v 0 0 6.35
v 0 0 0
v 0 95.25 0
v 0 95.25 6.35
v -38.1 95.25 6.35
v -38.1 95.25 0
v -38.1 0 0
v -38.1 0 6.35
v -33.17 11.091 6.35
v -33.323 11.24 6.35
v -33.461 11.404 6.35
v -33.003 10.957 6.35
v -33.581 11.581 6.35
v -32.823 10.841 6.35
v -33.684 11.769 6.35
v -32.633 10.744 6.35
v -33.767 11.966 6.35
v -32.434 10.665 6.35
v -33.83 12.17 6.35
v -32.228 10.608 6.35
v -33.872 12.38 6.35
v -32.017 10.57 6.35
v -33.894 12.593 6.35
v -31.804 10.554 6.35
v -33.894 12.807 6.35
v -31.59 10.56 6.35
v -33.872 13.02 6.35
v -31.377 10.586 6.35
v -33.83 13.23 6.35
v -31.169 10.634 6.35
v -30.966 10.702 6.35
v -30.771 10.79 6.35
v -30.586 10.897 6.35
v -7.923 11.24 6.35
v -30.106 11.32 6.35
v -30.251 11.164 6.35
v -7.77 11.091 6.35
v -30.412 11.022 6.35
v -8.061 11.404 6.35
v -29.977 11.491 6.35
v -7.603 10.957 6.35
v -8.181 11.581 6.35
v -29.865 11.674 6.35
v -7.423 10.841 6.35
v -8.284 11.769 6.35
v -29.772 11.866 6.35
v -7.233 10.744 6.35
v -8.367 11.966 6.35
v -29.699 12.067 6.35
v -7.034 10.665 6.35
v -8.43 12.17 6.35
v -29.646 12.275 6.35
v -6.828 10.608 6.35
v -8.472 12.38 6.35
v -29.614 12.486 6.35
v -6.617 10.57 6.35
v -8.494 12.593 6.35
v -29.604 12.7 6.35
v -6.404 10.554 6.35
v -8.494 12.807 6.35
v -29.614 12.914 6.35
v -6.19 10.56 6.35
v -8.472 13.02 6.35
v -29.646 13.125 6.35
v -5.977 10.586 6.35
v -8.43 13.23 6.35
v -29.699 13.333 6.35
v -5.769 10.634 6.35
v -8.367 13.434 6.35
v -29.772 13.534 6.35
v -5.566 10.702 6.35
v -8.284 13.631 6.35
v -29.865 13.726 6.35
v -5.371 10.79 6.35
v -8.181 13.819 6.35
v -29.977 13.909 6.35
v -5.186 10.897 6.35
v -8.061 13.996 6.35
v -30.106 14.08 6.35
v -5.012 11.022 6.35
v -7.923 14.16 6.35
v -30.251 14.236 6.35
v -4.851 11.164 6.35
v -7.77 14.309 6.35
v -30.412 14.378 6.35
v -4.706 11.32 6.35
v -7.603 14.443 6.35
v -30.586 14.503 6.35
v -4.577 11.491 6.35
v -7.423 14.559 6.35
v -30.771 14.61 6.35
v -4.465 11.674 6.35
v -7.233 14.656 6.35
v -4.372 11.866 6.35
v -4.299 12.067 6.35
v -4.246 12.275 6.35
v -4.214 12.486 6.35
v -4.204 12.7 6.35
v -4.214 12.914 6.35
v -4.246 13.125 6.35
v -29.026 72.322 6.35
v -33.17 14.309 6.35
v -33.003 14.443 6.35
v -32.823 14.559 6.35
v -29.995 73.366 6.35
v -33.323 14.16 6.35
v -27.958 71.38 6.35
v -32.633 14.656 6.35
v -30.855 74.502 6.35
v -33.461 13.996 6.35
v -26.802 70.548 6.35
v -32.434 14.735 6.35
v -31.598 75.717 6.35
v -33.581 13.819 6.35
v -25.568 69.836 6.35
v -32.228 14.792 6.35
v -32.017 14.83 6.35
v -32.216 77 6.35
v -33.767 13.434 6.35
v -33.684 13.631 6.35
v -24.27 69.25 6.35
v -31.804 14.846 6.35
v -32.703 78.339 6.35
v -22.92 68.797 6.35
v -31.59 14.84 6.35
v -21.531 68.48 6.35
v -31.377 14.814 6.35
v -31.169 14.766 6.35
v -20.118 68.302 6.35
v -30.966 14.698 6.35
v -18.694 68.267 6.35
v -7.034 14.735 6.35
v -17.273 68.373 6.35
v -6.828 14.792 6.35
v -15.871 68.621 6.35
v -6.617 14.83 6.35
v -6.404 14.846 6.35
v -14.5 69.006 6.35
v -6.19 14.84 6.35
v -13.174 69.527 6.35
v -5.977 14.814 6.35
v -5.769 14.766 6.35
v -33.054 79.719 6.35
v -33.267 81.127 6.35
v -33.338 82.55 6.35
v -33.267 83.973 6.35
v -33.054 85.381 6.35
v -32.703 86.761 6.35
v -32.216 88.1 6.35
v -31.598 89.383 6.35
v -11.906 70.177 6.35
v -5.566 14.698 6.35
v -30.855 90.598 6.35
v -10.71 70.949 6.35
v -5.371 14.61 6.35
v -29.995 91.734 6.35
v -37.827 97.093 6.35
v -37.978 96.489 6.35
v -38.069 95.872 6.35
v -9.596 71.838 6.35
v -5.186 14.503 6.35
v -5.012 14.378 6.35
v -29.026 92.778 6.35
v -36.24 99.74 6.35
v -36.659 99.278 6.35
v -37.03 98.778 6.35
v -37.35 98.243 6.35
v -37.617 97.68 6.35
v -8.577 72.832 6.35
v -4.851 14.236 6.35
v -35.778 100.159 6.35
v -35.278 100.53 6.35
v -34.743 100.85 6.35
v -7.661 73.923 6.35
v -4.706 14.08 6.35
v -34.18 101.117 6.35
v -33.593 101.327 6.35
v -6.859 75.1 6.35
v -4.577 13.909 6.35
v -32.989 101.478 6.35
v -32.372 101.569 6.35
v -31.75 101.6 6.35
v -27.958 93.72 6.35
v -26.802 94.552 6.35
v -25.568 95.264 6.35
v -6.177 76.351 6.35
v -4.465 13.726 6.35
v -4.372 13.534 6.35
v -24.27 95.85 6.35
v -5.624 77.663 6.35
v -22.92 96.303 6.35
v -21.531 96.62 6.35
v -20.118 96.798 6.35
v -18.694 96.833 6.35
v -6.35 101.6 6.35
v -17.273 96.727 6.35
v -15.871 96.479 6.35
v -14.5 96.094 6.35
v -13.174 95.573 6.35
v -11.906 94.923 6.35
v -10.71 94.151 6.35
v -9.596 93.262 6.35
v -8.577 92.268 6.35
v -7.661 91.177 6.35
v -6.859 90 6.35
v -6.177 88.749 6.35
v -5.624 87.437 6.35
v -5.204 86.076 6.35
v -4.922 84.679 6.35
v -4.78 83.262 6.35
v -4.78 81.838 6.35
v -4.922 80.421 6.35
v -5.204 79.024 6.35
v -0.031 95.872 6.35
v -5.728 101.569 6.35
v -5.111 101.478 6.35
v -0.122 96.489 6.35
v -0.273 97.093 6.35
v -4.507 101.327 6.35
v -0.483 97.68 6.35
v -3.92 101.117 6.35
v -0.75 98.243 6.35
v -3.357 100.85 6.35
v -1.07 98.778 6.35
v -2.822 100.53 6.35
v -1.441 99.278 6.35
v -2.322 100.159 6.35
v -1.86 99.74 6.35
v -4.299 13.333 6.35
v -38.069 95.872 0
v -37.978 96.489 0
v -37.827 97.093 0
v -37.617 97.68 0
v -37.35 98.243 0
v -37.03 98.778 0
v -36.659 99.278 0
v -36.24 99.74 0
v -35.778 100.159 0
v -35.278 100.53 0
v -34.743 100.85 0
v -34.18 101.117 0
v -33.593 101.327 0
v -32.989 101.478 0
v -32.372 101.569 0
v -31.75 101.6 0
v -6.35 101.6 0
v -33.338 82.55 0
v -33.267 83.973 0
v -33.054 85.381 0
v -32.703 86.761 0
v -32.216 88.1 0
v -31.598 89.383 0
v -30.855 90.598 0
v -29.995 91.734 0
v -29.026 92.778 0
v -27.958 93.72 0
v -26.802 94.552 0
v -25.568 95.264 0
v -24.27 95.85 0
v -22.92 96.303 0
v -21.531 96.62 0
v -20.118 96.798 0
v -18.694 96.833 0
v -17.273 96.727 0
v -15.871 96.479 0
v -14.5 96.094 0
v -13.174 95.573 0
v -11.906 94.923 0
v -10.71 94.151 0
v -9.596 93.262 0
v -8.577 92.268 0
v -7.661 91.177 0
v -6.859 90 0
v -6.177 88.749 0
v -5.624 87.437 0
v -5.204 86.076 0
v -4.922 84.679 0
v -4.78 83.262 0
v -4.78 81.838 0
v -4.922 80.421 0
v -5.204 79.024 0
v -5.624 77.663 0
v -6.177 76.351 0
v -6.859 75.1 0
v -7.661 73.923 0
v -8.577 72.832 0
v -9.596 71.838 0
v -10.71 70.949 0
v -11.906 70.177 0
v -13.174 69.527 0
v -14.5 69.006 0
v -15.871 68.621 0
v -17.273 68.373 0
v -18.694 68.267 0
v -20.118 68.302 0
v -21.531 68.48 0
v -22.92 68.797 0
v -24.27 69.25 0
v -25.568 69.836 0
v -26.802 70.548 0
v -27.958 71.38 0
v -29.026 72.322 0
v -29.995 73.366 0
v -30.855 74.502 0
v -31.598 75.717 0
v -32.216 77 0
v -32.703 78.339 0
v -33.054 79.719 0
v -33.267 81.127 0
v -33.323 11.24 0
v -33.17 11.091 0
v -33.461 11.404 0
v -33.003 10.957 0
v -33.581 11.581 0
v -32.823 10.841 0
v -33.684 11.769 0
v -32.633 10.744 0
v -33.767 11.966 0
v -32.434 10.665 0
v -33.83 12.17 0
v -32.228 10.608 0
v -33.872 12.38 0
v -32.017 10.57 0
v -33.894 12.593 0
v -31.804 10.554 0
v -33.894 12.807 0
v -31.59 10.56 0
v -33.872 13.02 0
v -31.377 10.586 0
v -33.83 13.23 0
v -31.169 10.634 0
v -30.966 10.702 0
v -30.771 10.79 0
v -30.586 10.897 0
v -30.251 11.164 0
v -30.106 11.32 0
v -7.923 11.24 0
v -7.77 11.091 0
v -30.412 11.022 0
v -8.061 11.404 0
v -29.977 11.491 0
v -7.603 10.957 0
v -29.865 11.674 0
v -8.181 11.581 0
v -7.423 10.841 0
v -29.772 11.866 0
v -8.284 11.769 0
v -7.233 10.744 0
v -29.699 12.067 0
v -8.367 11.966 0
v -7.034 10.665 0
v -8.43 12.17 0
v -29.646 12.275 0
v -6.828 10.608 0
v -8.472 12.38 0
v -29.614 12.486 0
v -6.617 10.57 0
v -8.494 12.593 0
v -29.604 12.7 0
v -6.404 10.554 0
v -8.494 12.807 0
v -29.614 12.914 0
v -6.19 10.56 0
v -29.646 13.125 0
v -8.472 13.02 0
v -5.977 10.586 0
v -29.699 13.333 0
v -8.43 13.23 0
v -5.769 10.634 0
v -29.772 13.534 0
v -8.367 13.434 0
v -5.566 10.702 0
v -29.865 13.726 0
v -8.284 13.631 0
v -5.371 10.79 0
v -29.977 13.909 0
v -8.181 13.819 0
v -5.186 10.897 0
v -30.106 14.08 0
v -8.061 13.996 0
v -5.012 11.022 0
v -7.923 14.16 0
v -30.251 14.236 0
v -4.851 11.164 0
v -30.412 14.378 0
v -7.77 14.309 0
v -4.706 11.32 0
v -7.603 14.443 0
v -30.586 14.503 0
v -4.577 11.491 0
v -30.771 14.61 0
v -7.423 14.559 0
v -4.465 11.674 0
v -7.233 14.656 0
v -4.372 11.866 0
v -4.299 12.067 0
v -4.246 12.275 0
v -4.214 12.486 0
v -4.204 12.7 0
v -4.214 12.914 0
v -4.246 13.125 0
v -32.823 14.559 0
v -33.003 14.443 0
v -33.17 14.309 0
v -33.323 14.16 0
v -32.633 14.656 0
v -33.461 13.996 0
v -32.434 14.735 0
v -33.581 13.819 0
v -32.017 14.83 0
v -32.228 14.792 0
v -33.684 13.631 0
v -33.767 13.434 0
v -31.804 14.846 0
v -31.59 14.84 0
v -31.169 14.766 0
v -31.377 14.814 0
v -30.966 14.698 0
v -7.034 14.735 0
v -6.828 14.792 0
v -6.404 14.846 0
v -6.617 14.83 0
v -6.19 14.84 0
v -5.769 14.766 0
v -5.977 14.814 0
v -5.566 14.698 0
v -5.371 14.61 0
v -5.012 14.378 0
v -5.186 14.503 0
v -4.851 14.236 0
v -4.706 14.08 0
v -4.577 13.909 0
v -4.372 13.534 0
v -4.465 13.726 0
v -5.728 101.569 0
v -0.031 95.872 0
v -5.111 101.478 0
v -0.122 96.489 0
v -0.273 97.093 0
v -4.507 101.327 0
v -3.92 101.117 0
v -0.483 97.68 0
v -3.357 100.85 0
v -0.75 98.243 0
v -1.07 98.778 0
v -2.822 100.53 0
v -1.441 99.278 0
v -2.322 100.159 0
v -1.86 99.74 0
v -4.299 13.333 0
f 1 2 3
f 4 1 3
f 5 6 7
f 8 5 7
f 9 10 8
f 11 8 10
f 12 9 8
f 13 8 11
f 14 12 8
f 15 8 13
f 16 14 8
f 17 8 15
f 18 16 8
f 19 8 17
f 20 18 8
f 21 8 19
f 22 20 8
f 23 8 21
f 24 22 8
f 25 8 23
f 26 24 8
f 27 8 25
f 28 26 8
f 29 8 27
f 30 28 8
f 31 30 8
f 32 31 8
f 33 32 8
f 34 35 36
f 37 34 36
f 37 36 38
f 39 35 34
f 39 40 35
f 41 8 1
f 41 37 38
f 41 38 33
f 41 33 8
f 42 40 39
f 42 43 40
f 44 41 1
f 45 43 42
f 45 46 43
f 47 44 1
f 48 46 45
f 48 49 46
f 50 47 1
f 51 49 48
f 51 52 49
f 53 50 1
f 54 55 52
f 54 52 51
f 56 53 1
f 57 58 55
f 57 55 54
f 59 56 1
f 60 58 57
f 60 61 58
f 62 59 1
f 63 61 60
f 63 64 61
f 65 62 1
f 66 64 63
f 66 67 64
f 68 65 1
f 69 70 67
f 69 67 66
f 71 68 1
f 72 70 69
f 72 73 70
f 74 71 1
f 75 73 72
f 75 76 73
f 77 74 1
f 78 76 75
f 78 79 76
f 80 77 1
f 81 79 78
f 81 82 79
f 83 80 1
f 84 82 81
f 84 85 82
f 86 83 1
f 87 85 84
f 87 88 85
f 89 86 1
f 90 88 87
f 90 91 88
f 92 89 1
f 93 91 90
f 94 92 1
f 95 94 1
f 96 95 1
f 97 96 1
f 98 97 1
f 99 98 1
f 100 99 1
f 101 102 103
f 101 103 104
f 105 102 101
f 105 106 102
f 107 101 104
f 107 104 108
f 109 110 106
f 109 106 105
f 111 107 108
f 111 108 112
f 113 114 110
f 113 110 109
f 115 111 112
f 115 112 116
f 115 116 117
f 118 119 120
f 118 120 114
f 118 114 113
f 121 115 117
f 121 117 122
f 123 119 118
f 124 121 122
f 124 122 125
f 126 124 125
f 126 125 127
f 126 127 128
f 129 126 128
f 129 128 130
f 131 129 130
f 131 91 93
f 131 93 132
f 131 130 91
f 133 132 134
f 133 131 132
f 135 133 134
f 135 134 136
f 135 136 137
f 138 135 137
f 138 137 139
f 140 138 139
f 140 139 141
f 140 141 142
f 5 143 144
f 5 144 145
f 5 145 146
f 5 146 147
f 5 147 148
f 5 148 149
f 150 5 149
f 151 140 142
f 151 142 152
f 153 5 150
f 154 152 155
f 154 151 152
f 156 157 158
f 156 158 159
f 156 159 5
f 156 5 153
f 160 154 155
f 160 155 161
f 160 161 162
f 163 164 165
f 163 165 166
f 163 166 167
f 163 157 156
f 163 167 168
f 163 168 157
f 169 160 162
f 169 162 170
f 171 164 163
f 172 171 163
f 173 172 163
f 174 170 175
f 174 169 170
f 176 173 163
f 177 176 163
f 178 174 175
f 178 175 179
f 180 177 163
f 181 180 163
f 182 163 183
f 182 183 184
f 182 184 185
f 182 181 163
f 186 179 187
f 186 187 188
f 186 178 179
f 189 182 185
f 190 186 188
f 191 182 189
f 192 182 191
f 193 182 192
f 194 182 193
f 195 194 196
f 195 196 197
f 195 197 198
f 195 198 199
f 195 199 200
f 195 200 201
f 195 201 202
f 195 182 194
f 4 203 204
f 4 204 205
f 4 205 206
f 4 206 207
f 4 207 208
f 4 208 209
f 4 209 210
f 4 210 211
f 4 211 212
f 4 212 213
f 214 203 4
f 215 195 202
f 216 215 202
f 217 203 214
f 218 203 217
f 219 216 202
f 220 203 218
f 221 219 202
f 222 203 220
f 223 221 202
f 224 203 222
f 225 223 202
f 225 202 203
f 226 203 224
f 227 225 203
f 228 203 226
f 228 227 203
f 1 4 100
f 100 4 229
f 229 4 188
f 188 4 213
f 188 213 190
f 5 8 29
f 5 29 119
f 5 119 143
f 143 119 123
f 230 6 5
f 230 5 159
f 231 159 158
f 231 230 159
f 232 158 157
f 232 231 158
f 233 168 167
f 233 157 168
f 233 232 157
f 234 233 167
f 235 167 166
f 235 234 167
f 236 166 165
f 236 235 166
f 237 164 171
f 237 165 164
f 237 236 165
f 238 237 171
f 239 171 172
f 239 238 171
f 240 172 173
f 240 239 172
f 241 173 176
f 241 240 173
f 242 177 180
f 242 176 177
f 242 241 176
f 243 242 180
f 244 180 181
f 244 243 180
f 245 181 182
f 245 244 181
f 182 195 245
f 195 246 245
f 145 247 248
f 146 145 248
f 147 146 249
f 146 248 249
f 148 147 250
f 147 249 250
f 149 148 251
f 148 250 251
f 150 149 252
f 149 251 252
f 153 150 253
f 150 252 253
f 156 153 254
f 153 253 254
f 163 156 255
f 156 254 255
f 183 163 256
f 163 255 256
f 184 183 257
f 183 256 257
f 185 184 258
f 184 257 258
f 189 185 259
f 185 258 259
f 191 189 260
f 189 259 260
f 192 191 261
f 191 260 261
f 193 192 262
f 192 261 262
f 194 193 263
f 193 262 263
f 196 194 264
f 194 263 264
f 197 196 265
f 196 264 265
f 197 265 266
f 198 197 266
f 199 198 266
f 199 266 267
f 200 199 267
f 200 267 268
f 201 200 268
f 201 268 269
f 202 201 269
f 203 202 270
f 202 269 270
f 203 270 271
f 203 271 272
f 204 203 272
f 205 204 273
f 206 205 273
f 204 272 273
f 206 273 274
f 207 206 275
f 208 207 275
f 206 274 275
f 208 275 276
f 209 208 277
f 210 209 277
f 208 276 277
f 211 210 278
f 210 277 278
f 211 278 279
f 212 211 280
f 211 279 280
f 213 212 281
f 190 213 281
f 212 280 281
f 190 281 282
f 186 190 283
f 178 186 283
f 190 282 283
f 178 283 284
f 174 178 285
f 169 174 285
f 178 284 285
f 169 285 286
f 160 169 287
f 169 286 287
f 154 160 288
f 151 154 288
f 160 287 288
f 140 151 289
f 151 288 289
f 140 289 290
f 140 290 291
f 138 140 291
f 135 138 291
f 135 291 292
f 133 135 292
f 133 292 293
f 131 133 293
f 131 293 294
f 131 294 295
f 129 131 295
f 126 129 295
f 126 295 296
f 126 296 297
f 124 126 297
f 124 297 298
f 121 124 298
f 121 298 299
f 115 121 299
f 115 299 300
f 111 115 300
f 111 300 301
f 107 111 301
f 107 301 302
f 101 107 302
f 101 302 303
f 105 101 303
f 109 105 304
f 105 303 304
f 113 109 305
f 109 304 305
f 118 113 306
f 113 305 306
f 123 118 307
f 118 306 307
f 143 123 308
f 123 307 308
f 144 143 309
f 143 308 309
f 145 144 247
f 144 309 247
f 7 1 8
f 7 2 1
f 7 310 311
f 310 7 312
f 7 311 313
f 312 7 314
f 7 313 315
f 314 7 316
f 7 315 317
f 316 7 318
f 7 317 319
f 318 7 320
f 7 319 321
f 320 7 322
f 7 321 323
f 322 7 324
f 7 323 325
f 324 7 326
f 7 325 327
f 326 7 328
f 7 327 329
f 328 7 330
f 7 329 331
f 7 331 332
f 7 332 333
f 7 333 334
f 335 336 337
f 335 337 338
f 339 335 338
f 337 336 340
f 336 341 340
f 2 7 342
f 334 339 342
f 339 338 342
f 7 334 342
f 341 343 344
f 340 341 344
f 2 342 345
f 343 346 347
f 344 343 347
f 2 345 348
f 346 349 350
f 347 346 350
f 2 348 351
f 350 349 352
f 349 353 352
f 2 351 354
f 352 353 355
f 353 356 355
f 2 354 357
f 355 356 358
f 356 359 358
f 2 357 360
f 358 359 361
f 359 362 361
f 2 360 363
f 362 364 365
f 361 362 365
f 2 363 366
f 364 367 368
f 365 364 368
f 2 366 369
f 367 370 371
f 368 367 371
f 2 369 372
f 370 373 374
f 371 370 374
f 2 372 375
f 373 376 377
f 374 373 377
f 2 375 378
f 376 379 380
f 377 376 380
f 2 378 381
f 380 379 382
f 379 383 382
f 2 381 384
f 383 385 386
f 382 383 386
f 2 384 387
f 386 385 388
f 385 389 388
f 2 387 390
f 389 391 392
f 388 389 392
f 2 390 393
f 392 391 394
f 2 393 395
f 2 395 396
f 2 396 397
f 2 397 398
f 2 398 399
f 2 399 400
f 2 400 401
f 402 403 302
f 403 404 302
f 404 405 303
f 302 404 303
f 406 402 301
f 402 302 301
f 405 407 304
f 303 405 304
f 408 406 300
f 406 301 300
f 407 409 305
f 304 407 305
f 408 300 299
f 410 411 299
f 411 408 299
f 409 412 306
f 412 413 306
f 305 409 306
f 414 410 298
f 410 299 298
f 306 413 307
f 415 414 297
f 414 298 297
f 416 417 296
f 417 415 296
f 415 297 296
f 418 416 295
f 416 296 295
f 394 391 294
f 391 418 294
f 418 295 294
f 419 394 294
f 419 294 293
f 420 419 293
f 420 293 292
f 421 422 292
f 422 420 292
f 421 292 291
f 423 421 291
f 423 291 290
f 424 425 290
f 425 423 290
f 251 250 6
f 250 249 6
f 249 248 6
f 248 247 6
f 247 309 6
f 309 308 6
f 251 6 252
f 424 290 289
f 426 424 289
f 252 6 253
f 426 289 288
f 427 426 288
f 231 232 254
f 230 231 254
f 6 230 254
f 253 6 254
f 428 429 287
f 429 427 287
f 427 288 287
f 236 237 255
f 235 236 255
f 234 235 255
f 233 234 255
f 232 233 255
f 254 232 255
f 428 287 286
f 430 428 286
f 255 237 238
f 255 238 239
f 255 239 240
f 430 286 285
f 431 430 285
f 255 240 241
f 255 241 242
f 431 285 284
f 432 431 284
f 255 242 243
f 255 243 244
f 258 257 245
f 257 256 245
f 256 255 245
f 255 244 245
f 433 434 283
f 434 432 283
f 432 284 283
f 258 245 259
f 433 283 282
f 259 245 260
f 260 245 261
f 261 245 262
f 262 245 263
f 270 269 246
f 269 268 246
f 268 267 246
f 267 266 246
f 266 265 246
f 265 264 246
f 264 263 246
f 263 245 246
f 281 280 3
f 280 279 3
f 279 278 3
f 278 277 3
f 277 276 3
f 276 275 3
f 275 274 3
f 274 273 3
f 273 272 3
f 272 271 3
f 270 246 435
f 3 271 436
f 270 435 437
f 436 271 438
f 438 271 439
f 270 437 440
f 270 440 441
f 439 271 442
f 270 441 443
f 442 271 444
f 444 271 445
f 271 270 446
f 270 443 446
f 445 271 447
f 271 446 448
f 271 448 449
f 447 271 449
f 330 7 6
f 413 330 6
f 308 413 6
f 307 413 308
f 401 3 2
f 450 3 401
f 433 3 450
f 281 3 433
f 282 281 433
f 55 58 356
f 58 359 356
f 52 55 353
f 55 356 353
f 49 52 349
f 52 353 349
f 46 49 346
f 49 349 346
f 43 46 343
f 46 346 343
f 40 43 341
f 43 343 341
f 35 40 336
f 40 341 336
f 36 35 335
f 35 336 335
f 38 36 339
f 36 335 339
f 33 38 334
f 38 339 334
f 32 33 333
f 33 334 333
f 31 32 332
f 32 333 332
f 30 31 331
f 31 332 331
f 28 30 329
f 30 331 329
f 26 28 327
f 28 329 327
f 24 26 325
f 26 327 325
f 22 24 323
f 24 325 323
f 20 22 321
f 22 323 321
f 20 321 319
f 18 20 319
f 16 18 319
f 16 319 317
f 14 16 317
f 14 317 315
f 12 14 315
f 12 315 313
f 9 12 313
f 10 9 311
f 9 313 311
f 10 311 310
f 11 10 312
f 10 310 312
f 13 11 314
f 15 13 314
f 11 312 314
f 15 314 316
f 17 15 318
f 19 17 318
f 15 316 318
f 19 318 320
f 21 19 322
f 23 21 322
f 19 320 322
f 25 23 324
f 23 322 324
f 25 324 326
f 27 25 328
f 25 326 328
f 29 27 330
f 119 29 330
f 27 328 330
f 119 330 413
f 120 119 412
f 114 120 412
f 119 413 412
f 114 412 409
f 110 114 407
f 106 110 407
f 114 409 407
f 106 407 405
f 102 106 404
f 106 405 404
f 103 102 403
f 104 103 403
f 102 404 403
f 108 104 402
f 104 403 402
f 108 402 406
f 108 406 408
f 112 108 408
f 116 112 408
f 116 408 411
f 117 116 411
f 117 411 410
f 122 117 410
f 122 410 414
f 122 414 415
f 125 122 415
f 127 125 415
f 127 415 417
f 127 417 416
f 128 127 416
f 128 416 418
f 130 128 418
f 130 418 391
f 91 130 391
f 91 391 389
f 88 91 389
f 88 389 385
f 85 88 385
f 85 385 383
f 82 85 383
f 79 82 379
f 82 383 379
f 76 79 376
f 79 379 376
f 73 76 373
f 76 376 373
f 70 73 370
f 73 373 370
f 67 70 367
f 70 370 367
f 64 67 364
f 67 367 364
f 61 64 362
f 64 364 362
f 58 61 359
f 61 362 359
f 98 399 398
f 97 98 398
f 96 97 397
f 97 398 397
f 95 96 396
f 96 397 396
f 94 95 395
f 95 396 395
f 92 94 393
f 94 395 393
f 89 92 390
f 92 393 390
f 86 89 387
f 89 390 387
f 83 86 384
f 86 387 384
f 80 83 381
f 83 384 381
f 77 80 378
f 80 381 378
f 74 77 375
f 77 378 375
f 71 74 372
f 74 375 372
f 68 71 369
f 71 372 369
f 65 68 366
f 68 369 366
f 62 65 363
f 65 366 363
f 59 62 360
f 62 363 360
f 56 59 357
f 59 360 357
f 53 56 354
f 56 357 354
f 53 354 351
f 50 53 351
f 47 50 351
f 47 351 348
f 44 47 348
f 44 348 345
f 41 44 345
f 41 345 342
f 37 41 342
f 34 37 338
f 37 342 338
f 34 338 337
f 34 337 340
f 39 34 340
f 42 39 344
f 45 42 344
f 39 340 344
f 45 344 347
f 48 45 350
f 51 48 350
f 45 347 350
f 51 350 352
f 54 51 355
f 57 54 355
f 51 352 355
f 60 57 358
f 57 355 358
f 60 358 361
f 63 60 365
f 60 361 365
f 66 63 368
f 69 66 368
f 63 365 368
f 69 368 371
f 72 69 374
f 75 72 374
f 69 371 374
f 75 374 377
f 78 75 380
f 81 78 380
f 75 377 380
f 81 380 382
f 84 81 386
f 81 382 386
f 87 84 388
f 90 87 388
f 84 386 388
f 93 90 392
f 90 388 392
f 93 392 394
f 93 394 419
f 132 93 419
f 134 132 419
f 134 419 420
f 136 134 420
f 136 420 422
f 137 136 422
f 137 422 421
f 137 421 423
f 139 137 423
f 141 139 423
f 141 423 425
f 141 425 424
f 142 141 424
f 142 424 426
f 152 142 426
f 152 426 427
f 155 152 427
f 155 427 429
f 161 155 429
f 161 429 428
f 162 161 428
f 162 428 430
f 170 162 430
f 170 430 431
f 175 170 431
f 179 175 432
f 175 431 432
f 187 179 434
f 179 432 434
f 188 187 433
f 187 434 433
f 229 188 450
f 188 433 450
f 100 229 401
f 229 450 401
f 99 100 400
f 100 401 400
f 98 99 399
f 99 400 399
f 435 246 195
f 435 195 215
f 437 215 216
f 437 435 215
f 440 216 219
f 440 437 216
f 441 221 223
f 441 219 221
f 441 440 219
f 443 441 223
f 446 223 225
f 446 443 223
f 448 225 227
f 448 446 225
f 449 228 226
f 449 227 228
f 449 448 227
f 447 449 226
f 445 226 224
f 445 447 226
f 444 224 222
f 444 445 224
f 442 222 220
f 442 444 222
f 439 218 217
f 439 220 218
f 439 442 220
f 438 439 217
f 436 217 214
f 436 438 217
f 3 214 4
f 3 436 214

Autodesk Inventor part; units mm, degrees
ref_plane "YZ Plane" through (0, 0, 0) normal (1, 0, 0) x (0, 1, 0)
ref_plane "XZ Plane" through (0, 0, 0) normal (0, 1, 0) x (-1, 0, 0)
ref_plane "XY Plane" through (0, 0, 0) normal (0, 0, 1) x (1, 0, 0)
sketch "Sketch1" plane through (0, 0, 0) normal (0, 0, 1) x (1, 0, 0)
  line L0 (0, 0) -> (-38.1, 0)
  line L1 (0, 0) -> (0, 95.25)
  line L2 (-6.35, 101.6) -> (-38.1, 101.6)
  line L3 (-38.1, 95.25) -> (-38.1, 0)
  line L4 (-31.75, 101.6) -> (-31.75, 101.6)
  line L5 (-31.75, 101.6) -> (-31.75, 12.7)
  line L6 (0, 101.6) -> (-6.35, 101.6)
  line L7 (-6.35, 101.6) -> (-6.35, 12.7)
  circle A0 centre (-31.75, 12.7) radius 2.1463
  circle A1 centre (-6.35, 12.7) radius 2.1463
  arc A2 (-31.75, 101.6) -> (-38.1, 95.25) centre (-31.75, 95.25) ccw
  arc A3 (0, 95.25) -> (-6.35, 101.6) centre (-6.35, 95.25) ccw
  line L8 (-22.225, 101.6) -> (-22.225, 76.2)
  dimension "d0" = 38.1
  dimension "d1" = 101.6
  dimension "d2" = 6.35
  dimension "d3" = 88.9
  dimension "d4" = 6.35
  dimension "d5" = 4.2926
  dimension "d6" = 4.2926
  dimension "d7" = 88.9
  dimension "d19" = 6.35
  dimension "d20" = 6.35
  dimension "d23" = 25.4
extrude "Plate1" add sketch "Sketch1" along normal blind 6.35
sketch "Sketch4" plane through (0, 0, 0) normal (0, 0, -1) x (-1, 0, 0)
  line L0 (6.35, 101.6) -> (31.75, 101.6) projected
  line L1 (19.05, 101.6) -> (19.05, 82.55)
  circle A0 centre (19.05, 82.55) radius 14.2875
  dimension "d25" = 19.05
  dimension "d26" = 28.575
extrude "Cut1" cut sketch "Sketch4" against normal blind 6.35
equation "\"d27\" = Thickness"
equation "\"BendRadius\" = Thickness"
equation "\"BendReliefWidth\" = Thickness"
equation "\"BendReliefDepth\" = 0.5 * Thickness"
equation "\"CornerReliefSize\" = 4 * Thickness"
equation "\"MinimumRemnant\" = 2 * Thickness"
equation "\"TransitionRadius\" = BendRadius"
equation "\"JacobiRadiusSize\" = BendRadius"
equation "\"GapSize\" = Thickness"
equation "\"d8\" = BendRadius"
equation "\"Thickness\" = 6.35"
properties part number "arm mount"
